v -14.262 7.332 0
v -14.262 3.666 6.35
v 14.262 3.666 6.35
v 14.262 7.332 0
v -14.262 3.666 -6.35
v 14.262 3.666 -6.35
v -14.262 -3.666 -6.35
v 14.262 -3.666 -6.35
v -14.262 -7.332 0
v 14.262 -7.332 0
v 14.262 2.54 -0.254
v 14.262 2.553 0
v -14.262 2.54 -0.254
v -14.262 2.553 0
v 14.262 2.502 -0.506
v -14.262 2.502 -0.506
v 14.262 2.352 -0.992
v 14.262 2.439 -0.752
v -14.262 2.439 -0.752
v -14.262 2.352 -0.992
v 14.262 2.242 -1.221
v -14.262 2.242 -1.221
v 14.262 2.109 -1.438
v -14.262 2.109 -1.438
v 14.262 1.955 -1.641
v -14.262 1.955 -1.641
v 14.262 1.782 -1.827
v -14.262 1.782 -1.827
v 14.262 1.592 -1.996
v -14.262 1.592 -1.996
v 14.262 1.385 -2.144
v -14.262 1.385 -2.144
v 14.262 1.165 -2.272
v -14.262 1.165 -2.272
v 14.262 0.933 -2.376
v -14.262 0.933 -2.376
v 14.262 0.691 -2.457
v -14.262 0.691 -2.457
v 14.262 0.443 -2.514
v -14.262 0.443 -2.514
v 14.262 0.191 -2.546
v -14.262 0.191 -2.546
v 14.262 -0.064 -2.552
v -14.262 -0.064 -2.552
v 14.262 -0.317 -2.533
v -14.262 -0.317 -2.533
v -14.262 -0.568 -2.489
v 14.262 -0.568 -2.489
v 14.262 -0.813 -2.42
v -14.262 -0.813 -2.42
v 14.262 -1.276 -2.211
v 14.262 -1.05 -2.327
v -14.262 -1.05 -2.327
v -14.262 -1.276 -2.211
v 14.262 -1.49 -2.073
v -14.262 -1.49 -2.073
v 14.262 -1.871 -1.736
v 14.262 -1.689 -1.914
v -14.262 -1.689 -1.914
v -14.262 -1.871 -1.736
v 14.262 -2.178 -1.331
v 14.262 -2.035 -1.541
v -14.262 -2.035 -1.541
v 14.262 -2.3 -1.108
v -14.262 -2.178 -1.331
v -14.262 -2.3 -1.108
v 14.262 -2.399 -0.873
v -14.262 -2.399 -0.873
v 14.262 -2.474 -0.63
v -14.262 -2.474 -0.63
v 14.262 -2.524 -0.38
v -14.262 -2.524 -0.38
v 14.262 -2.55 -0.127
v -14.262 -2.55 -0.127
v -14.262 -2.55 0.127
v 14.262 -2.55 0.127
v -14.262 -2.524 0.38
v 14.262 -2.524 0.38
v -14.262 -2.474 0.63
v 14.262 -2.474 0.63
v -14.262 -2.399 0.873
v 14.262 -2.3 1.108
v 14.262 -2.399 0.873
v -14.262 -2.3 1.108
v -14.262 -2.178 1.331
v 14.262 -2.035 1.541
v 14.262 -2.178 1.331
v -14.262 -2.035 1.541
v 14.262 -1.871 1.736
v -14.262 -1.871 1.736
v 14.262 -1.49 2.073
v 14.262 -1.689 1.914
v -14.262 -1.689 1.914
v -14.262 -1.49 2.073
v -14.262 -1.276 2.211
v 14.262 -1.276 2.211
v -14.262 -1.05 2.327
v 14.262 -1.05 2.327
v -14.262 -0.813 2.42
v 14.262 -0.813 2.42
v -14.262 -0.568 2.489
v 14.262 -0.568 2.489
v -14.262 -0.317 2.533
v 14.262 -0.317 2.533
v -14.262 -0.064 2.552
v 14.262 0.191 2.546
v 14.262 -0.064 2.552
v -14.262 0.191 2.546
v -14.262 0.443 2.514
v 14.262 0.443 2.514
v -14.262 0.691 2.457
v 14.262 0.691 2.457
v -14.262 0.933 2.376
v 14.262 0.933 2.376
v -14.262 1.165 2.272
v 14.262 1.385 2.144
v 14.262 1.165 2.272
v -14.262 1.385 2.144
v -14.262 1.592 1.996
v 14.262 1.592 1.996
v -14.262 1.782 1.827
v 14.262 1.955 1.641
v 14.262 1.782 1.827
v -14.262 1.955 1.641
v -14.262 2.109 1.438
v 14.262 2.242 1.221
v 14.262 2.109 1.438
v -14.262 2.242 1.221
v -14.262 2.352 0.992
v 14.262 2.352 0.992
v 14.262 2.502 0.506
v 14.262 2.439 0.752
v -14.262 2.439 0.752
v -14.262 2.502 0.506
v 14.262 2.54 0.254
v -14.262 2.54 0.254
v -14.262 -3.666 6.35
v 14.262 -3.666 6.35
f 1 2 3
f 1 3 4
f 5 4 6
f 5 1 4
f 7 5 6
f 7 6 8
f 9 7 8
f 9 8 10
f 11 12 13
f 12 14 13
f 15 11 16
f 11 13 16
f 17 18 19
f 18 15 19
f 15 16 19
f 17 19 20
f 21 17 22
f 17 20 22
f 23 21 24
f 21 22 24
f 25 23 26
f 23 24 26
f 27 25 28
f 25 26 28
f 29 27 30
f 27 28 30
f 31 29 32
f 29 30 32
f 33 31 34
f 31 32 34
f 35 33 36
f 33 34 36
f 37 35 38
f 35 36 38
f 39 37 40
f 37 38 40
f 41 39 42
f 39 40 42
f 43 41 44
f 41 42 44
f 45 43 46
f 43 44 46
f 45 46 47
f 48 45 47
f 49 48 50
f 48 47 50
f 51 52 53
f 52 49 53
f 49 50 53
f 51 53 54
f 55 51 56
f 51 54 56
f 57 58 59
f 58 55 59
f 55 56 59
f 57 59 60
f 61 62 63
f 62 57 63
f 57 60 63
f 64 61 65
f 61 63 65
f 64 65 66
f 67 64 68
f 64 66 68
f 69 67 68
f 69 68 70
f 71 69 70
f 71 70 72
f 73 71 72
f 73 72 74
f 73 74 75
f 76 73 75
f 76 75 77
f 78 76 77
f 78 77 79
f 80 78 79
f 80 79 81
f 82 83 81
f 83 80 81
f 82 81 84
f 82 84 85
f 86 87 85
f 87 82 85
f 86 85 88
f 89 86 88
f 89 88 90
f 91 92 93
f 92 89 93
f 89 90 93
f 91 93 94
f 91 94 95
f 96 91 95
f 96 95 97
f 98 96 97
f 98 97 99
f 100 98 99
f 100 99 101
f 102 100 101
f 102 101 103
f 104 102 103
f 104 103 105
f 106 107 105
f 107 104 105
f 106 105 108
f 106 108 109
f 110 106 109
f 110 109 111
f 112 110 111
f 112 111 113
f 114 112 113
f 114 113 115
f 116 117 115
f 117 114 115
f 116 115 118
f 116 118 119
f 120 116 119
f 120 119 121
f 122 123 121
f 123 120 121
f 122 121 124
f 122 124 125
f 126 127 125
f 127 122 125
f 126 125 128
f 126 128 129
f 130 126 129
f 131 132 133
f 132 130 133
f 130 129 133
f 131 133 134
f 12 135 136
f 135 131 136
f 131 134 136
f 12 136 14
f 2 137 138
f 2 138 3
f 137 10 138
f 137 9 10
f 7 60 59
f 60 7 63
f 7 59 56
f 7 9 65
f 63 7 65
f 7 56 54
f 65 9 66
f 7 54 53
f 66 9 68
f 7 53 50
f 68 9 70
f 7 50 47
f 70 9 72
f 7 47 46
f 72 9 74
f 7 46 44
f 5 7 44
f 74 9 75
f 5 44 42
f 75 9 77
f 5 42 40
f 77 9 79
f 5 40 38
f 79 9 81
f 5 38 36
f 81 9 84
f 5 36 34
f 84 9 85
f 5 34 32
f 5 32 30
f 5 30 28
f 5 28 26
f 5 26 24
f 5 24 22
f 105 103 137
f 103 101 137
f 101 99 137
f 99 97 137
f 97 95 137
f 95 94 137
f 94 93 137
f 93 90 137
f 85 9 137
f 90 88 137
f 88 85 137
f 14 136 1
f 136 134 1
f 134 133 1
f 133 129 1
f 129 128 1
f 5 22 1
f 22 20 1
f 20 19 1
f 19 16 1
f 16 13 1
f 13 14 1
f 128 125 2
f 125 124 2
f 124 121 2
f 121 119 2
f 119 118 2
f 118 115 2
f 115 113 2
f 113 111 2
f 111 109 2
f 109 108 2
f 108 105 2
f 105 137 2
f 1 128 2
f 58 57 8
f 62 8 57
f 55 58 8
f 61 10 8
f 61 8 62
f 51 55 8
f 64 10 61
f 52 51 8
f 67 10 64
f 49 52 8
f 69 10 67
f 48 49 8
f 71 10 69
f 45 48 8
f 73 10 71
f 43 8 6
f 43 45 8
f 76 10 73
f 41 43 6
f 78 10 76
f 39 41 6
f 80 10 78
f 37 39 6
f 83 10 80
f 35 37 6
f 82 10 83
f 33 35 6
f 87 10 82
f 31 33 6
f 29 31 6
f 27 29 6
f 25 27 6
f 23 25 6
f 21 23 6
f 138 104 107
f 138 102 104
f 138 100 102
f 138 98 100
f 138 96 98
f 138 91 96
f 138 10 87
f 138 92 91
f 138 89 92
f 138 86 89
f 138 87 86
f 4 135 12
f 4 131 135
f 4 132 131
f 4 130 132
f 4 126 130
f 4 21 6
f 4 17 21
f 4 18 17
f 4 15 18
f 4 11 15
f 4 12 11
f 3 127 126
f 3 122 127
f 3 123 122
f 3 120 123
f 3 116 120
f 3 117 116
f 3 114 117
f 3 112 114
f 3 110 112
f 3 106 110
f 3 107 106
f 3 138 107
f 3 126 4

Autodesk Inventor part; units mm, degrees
ref_plane "YZ Plane" through (0, 0, 0) normal (1, 0, 0) x (0, 1, 0)
ref_plane "XZ Plane" through (0, 0, 0) normal (0, 1, 0) x (-1, 0, 0)
ref_plane "XY Plane" through (0, 0, 0) normal (0, 0, 1) x (1, 0, 0)
sketch "Sketch1" plane through (0, 0, 0) normal (1, 0, 0) x (0, 1, 0)
  circle A0 centre (0, 0) radius 2.5527
  line L0 (7.3323, 0) -> (3.6662, -6.35)
  line L1 (3.6662, -6.35) -> (-3.6662, -6.35)
  line L2 (-3.6662, -6.35) -> (-7.3323, 0)
  line L3 (-7.3323, 0) -> (-3.6662, 6.35)
  line L4 (-3.6662, 6.35) -> (3.6662, 6.35)
  line L5 (3.6662, 6.35) -> (7.3323, 0)
  point P0 (0, -6.35)
  dimension "d1" = 12.7
  dimension "d5" = 5.1054
extrude "Extrusion1" add sketch "Sketch1" along normal mid plane 28.5242
properties part number "1.123 hex shaft 0.25-20 0.5" material "Aluminum 6061"
